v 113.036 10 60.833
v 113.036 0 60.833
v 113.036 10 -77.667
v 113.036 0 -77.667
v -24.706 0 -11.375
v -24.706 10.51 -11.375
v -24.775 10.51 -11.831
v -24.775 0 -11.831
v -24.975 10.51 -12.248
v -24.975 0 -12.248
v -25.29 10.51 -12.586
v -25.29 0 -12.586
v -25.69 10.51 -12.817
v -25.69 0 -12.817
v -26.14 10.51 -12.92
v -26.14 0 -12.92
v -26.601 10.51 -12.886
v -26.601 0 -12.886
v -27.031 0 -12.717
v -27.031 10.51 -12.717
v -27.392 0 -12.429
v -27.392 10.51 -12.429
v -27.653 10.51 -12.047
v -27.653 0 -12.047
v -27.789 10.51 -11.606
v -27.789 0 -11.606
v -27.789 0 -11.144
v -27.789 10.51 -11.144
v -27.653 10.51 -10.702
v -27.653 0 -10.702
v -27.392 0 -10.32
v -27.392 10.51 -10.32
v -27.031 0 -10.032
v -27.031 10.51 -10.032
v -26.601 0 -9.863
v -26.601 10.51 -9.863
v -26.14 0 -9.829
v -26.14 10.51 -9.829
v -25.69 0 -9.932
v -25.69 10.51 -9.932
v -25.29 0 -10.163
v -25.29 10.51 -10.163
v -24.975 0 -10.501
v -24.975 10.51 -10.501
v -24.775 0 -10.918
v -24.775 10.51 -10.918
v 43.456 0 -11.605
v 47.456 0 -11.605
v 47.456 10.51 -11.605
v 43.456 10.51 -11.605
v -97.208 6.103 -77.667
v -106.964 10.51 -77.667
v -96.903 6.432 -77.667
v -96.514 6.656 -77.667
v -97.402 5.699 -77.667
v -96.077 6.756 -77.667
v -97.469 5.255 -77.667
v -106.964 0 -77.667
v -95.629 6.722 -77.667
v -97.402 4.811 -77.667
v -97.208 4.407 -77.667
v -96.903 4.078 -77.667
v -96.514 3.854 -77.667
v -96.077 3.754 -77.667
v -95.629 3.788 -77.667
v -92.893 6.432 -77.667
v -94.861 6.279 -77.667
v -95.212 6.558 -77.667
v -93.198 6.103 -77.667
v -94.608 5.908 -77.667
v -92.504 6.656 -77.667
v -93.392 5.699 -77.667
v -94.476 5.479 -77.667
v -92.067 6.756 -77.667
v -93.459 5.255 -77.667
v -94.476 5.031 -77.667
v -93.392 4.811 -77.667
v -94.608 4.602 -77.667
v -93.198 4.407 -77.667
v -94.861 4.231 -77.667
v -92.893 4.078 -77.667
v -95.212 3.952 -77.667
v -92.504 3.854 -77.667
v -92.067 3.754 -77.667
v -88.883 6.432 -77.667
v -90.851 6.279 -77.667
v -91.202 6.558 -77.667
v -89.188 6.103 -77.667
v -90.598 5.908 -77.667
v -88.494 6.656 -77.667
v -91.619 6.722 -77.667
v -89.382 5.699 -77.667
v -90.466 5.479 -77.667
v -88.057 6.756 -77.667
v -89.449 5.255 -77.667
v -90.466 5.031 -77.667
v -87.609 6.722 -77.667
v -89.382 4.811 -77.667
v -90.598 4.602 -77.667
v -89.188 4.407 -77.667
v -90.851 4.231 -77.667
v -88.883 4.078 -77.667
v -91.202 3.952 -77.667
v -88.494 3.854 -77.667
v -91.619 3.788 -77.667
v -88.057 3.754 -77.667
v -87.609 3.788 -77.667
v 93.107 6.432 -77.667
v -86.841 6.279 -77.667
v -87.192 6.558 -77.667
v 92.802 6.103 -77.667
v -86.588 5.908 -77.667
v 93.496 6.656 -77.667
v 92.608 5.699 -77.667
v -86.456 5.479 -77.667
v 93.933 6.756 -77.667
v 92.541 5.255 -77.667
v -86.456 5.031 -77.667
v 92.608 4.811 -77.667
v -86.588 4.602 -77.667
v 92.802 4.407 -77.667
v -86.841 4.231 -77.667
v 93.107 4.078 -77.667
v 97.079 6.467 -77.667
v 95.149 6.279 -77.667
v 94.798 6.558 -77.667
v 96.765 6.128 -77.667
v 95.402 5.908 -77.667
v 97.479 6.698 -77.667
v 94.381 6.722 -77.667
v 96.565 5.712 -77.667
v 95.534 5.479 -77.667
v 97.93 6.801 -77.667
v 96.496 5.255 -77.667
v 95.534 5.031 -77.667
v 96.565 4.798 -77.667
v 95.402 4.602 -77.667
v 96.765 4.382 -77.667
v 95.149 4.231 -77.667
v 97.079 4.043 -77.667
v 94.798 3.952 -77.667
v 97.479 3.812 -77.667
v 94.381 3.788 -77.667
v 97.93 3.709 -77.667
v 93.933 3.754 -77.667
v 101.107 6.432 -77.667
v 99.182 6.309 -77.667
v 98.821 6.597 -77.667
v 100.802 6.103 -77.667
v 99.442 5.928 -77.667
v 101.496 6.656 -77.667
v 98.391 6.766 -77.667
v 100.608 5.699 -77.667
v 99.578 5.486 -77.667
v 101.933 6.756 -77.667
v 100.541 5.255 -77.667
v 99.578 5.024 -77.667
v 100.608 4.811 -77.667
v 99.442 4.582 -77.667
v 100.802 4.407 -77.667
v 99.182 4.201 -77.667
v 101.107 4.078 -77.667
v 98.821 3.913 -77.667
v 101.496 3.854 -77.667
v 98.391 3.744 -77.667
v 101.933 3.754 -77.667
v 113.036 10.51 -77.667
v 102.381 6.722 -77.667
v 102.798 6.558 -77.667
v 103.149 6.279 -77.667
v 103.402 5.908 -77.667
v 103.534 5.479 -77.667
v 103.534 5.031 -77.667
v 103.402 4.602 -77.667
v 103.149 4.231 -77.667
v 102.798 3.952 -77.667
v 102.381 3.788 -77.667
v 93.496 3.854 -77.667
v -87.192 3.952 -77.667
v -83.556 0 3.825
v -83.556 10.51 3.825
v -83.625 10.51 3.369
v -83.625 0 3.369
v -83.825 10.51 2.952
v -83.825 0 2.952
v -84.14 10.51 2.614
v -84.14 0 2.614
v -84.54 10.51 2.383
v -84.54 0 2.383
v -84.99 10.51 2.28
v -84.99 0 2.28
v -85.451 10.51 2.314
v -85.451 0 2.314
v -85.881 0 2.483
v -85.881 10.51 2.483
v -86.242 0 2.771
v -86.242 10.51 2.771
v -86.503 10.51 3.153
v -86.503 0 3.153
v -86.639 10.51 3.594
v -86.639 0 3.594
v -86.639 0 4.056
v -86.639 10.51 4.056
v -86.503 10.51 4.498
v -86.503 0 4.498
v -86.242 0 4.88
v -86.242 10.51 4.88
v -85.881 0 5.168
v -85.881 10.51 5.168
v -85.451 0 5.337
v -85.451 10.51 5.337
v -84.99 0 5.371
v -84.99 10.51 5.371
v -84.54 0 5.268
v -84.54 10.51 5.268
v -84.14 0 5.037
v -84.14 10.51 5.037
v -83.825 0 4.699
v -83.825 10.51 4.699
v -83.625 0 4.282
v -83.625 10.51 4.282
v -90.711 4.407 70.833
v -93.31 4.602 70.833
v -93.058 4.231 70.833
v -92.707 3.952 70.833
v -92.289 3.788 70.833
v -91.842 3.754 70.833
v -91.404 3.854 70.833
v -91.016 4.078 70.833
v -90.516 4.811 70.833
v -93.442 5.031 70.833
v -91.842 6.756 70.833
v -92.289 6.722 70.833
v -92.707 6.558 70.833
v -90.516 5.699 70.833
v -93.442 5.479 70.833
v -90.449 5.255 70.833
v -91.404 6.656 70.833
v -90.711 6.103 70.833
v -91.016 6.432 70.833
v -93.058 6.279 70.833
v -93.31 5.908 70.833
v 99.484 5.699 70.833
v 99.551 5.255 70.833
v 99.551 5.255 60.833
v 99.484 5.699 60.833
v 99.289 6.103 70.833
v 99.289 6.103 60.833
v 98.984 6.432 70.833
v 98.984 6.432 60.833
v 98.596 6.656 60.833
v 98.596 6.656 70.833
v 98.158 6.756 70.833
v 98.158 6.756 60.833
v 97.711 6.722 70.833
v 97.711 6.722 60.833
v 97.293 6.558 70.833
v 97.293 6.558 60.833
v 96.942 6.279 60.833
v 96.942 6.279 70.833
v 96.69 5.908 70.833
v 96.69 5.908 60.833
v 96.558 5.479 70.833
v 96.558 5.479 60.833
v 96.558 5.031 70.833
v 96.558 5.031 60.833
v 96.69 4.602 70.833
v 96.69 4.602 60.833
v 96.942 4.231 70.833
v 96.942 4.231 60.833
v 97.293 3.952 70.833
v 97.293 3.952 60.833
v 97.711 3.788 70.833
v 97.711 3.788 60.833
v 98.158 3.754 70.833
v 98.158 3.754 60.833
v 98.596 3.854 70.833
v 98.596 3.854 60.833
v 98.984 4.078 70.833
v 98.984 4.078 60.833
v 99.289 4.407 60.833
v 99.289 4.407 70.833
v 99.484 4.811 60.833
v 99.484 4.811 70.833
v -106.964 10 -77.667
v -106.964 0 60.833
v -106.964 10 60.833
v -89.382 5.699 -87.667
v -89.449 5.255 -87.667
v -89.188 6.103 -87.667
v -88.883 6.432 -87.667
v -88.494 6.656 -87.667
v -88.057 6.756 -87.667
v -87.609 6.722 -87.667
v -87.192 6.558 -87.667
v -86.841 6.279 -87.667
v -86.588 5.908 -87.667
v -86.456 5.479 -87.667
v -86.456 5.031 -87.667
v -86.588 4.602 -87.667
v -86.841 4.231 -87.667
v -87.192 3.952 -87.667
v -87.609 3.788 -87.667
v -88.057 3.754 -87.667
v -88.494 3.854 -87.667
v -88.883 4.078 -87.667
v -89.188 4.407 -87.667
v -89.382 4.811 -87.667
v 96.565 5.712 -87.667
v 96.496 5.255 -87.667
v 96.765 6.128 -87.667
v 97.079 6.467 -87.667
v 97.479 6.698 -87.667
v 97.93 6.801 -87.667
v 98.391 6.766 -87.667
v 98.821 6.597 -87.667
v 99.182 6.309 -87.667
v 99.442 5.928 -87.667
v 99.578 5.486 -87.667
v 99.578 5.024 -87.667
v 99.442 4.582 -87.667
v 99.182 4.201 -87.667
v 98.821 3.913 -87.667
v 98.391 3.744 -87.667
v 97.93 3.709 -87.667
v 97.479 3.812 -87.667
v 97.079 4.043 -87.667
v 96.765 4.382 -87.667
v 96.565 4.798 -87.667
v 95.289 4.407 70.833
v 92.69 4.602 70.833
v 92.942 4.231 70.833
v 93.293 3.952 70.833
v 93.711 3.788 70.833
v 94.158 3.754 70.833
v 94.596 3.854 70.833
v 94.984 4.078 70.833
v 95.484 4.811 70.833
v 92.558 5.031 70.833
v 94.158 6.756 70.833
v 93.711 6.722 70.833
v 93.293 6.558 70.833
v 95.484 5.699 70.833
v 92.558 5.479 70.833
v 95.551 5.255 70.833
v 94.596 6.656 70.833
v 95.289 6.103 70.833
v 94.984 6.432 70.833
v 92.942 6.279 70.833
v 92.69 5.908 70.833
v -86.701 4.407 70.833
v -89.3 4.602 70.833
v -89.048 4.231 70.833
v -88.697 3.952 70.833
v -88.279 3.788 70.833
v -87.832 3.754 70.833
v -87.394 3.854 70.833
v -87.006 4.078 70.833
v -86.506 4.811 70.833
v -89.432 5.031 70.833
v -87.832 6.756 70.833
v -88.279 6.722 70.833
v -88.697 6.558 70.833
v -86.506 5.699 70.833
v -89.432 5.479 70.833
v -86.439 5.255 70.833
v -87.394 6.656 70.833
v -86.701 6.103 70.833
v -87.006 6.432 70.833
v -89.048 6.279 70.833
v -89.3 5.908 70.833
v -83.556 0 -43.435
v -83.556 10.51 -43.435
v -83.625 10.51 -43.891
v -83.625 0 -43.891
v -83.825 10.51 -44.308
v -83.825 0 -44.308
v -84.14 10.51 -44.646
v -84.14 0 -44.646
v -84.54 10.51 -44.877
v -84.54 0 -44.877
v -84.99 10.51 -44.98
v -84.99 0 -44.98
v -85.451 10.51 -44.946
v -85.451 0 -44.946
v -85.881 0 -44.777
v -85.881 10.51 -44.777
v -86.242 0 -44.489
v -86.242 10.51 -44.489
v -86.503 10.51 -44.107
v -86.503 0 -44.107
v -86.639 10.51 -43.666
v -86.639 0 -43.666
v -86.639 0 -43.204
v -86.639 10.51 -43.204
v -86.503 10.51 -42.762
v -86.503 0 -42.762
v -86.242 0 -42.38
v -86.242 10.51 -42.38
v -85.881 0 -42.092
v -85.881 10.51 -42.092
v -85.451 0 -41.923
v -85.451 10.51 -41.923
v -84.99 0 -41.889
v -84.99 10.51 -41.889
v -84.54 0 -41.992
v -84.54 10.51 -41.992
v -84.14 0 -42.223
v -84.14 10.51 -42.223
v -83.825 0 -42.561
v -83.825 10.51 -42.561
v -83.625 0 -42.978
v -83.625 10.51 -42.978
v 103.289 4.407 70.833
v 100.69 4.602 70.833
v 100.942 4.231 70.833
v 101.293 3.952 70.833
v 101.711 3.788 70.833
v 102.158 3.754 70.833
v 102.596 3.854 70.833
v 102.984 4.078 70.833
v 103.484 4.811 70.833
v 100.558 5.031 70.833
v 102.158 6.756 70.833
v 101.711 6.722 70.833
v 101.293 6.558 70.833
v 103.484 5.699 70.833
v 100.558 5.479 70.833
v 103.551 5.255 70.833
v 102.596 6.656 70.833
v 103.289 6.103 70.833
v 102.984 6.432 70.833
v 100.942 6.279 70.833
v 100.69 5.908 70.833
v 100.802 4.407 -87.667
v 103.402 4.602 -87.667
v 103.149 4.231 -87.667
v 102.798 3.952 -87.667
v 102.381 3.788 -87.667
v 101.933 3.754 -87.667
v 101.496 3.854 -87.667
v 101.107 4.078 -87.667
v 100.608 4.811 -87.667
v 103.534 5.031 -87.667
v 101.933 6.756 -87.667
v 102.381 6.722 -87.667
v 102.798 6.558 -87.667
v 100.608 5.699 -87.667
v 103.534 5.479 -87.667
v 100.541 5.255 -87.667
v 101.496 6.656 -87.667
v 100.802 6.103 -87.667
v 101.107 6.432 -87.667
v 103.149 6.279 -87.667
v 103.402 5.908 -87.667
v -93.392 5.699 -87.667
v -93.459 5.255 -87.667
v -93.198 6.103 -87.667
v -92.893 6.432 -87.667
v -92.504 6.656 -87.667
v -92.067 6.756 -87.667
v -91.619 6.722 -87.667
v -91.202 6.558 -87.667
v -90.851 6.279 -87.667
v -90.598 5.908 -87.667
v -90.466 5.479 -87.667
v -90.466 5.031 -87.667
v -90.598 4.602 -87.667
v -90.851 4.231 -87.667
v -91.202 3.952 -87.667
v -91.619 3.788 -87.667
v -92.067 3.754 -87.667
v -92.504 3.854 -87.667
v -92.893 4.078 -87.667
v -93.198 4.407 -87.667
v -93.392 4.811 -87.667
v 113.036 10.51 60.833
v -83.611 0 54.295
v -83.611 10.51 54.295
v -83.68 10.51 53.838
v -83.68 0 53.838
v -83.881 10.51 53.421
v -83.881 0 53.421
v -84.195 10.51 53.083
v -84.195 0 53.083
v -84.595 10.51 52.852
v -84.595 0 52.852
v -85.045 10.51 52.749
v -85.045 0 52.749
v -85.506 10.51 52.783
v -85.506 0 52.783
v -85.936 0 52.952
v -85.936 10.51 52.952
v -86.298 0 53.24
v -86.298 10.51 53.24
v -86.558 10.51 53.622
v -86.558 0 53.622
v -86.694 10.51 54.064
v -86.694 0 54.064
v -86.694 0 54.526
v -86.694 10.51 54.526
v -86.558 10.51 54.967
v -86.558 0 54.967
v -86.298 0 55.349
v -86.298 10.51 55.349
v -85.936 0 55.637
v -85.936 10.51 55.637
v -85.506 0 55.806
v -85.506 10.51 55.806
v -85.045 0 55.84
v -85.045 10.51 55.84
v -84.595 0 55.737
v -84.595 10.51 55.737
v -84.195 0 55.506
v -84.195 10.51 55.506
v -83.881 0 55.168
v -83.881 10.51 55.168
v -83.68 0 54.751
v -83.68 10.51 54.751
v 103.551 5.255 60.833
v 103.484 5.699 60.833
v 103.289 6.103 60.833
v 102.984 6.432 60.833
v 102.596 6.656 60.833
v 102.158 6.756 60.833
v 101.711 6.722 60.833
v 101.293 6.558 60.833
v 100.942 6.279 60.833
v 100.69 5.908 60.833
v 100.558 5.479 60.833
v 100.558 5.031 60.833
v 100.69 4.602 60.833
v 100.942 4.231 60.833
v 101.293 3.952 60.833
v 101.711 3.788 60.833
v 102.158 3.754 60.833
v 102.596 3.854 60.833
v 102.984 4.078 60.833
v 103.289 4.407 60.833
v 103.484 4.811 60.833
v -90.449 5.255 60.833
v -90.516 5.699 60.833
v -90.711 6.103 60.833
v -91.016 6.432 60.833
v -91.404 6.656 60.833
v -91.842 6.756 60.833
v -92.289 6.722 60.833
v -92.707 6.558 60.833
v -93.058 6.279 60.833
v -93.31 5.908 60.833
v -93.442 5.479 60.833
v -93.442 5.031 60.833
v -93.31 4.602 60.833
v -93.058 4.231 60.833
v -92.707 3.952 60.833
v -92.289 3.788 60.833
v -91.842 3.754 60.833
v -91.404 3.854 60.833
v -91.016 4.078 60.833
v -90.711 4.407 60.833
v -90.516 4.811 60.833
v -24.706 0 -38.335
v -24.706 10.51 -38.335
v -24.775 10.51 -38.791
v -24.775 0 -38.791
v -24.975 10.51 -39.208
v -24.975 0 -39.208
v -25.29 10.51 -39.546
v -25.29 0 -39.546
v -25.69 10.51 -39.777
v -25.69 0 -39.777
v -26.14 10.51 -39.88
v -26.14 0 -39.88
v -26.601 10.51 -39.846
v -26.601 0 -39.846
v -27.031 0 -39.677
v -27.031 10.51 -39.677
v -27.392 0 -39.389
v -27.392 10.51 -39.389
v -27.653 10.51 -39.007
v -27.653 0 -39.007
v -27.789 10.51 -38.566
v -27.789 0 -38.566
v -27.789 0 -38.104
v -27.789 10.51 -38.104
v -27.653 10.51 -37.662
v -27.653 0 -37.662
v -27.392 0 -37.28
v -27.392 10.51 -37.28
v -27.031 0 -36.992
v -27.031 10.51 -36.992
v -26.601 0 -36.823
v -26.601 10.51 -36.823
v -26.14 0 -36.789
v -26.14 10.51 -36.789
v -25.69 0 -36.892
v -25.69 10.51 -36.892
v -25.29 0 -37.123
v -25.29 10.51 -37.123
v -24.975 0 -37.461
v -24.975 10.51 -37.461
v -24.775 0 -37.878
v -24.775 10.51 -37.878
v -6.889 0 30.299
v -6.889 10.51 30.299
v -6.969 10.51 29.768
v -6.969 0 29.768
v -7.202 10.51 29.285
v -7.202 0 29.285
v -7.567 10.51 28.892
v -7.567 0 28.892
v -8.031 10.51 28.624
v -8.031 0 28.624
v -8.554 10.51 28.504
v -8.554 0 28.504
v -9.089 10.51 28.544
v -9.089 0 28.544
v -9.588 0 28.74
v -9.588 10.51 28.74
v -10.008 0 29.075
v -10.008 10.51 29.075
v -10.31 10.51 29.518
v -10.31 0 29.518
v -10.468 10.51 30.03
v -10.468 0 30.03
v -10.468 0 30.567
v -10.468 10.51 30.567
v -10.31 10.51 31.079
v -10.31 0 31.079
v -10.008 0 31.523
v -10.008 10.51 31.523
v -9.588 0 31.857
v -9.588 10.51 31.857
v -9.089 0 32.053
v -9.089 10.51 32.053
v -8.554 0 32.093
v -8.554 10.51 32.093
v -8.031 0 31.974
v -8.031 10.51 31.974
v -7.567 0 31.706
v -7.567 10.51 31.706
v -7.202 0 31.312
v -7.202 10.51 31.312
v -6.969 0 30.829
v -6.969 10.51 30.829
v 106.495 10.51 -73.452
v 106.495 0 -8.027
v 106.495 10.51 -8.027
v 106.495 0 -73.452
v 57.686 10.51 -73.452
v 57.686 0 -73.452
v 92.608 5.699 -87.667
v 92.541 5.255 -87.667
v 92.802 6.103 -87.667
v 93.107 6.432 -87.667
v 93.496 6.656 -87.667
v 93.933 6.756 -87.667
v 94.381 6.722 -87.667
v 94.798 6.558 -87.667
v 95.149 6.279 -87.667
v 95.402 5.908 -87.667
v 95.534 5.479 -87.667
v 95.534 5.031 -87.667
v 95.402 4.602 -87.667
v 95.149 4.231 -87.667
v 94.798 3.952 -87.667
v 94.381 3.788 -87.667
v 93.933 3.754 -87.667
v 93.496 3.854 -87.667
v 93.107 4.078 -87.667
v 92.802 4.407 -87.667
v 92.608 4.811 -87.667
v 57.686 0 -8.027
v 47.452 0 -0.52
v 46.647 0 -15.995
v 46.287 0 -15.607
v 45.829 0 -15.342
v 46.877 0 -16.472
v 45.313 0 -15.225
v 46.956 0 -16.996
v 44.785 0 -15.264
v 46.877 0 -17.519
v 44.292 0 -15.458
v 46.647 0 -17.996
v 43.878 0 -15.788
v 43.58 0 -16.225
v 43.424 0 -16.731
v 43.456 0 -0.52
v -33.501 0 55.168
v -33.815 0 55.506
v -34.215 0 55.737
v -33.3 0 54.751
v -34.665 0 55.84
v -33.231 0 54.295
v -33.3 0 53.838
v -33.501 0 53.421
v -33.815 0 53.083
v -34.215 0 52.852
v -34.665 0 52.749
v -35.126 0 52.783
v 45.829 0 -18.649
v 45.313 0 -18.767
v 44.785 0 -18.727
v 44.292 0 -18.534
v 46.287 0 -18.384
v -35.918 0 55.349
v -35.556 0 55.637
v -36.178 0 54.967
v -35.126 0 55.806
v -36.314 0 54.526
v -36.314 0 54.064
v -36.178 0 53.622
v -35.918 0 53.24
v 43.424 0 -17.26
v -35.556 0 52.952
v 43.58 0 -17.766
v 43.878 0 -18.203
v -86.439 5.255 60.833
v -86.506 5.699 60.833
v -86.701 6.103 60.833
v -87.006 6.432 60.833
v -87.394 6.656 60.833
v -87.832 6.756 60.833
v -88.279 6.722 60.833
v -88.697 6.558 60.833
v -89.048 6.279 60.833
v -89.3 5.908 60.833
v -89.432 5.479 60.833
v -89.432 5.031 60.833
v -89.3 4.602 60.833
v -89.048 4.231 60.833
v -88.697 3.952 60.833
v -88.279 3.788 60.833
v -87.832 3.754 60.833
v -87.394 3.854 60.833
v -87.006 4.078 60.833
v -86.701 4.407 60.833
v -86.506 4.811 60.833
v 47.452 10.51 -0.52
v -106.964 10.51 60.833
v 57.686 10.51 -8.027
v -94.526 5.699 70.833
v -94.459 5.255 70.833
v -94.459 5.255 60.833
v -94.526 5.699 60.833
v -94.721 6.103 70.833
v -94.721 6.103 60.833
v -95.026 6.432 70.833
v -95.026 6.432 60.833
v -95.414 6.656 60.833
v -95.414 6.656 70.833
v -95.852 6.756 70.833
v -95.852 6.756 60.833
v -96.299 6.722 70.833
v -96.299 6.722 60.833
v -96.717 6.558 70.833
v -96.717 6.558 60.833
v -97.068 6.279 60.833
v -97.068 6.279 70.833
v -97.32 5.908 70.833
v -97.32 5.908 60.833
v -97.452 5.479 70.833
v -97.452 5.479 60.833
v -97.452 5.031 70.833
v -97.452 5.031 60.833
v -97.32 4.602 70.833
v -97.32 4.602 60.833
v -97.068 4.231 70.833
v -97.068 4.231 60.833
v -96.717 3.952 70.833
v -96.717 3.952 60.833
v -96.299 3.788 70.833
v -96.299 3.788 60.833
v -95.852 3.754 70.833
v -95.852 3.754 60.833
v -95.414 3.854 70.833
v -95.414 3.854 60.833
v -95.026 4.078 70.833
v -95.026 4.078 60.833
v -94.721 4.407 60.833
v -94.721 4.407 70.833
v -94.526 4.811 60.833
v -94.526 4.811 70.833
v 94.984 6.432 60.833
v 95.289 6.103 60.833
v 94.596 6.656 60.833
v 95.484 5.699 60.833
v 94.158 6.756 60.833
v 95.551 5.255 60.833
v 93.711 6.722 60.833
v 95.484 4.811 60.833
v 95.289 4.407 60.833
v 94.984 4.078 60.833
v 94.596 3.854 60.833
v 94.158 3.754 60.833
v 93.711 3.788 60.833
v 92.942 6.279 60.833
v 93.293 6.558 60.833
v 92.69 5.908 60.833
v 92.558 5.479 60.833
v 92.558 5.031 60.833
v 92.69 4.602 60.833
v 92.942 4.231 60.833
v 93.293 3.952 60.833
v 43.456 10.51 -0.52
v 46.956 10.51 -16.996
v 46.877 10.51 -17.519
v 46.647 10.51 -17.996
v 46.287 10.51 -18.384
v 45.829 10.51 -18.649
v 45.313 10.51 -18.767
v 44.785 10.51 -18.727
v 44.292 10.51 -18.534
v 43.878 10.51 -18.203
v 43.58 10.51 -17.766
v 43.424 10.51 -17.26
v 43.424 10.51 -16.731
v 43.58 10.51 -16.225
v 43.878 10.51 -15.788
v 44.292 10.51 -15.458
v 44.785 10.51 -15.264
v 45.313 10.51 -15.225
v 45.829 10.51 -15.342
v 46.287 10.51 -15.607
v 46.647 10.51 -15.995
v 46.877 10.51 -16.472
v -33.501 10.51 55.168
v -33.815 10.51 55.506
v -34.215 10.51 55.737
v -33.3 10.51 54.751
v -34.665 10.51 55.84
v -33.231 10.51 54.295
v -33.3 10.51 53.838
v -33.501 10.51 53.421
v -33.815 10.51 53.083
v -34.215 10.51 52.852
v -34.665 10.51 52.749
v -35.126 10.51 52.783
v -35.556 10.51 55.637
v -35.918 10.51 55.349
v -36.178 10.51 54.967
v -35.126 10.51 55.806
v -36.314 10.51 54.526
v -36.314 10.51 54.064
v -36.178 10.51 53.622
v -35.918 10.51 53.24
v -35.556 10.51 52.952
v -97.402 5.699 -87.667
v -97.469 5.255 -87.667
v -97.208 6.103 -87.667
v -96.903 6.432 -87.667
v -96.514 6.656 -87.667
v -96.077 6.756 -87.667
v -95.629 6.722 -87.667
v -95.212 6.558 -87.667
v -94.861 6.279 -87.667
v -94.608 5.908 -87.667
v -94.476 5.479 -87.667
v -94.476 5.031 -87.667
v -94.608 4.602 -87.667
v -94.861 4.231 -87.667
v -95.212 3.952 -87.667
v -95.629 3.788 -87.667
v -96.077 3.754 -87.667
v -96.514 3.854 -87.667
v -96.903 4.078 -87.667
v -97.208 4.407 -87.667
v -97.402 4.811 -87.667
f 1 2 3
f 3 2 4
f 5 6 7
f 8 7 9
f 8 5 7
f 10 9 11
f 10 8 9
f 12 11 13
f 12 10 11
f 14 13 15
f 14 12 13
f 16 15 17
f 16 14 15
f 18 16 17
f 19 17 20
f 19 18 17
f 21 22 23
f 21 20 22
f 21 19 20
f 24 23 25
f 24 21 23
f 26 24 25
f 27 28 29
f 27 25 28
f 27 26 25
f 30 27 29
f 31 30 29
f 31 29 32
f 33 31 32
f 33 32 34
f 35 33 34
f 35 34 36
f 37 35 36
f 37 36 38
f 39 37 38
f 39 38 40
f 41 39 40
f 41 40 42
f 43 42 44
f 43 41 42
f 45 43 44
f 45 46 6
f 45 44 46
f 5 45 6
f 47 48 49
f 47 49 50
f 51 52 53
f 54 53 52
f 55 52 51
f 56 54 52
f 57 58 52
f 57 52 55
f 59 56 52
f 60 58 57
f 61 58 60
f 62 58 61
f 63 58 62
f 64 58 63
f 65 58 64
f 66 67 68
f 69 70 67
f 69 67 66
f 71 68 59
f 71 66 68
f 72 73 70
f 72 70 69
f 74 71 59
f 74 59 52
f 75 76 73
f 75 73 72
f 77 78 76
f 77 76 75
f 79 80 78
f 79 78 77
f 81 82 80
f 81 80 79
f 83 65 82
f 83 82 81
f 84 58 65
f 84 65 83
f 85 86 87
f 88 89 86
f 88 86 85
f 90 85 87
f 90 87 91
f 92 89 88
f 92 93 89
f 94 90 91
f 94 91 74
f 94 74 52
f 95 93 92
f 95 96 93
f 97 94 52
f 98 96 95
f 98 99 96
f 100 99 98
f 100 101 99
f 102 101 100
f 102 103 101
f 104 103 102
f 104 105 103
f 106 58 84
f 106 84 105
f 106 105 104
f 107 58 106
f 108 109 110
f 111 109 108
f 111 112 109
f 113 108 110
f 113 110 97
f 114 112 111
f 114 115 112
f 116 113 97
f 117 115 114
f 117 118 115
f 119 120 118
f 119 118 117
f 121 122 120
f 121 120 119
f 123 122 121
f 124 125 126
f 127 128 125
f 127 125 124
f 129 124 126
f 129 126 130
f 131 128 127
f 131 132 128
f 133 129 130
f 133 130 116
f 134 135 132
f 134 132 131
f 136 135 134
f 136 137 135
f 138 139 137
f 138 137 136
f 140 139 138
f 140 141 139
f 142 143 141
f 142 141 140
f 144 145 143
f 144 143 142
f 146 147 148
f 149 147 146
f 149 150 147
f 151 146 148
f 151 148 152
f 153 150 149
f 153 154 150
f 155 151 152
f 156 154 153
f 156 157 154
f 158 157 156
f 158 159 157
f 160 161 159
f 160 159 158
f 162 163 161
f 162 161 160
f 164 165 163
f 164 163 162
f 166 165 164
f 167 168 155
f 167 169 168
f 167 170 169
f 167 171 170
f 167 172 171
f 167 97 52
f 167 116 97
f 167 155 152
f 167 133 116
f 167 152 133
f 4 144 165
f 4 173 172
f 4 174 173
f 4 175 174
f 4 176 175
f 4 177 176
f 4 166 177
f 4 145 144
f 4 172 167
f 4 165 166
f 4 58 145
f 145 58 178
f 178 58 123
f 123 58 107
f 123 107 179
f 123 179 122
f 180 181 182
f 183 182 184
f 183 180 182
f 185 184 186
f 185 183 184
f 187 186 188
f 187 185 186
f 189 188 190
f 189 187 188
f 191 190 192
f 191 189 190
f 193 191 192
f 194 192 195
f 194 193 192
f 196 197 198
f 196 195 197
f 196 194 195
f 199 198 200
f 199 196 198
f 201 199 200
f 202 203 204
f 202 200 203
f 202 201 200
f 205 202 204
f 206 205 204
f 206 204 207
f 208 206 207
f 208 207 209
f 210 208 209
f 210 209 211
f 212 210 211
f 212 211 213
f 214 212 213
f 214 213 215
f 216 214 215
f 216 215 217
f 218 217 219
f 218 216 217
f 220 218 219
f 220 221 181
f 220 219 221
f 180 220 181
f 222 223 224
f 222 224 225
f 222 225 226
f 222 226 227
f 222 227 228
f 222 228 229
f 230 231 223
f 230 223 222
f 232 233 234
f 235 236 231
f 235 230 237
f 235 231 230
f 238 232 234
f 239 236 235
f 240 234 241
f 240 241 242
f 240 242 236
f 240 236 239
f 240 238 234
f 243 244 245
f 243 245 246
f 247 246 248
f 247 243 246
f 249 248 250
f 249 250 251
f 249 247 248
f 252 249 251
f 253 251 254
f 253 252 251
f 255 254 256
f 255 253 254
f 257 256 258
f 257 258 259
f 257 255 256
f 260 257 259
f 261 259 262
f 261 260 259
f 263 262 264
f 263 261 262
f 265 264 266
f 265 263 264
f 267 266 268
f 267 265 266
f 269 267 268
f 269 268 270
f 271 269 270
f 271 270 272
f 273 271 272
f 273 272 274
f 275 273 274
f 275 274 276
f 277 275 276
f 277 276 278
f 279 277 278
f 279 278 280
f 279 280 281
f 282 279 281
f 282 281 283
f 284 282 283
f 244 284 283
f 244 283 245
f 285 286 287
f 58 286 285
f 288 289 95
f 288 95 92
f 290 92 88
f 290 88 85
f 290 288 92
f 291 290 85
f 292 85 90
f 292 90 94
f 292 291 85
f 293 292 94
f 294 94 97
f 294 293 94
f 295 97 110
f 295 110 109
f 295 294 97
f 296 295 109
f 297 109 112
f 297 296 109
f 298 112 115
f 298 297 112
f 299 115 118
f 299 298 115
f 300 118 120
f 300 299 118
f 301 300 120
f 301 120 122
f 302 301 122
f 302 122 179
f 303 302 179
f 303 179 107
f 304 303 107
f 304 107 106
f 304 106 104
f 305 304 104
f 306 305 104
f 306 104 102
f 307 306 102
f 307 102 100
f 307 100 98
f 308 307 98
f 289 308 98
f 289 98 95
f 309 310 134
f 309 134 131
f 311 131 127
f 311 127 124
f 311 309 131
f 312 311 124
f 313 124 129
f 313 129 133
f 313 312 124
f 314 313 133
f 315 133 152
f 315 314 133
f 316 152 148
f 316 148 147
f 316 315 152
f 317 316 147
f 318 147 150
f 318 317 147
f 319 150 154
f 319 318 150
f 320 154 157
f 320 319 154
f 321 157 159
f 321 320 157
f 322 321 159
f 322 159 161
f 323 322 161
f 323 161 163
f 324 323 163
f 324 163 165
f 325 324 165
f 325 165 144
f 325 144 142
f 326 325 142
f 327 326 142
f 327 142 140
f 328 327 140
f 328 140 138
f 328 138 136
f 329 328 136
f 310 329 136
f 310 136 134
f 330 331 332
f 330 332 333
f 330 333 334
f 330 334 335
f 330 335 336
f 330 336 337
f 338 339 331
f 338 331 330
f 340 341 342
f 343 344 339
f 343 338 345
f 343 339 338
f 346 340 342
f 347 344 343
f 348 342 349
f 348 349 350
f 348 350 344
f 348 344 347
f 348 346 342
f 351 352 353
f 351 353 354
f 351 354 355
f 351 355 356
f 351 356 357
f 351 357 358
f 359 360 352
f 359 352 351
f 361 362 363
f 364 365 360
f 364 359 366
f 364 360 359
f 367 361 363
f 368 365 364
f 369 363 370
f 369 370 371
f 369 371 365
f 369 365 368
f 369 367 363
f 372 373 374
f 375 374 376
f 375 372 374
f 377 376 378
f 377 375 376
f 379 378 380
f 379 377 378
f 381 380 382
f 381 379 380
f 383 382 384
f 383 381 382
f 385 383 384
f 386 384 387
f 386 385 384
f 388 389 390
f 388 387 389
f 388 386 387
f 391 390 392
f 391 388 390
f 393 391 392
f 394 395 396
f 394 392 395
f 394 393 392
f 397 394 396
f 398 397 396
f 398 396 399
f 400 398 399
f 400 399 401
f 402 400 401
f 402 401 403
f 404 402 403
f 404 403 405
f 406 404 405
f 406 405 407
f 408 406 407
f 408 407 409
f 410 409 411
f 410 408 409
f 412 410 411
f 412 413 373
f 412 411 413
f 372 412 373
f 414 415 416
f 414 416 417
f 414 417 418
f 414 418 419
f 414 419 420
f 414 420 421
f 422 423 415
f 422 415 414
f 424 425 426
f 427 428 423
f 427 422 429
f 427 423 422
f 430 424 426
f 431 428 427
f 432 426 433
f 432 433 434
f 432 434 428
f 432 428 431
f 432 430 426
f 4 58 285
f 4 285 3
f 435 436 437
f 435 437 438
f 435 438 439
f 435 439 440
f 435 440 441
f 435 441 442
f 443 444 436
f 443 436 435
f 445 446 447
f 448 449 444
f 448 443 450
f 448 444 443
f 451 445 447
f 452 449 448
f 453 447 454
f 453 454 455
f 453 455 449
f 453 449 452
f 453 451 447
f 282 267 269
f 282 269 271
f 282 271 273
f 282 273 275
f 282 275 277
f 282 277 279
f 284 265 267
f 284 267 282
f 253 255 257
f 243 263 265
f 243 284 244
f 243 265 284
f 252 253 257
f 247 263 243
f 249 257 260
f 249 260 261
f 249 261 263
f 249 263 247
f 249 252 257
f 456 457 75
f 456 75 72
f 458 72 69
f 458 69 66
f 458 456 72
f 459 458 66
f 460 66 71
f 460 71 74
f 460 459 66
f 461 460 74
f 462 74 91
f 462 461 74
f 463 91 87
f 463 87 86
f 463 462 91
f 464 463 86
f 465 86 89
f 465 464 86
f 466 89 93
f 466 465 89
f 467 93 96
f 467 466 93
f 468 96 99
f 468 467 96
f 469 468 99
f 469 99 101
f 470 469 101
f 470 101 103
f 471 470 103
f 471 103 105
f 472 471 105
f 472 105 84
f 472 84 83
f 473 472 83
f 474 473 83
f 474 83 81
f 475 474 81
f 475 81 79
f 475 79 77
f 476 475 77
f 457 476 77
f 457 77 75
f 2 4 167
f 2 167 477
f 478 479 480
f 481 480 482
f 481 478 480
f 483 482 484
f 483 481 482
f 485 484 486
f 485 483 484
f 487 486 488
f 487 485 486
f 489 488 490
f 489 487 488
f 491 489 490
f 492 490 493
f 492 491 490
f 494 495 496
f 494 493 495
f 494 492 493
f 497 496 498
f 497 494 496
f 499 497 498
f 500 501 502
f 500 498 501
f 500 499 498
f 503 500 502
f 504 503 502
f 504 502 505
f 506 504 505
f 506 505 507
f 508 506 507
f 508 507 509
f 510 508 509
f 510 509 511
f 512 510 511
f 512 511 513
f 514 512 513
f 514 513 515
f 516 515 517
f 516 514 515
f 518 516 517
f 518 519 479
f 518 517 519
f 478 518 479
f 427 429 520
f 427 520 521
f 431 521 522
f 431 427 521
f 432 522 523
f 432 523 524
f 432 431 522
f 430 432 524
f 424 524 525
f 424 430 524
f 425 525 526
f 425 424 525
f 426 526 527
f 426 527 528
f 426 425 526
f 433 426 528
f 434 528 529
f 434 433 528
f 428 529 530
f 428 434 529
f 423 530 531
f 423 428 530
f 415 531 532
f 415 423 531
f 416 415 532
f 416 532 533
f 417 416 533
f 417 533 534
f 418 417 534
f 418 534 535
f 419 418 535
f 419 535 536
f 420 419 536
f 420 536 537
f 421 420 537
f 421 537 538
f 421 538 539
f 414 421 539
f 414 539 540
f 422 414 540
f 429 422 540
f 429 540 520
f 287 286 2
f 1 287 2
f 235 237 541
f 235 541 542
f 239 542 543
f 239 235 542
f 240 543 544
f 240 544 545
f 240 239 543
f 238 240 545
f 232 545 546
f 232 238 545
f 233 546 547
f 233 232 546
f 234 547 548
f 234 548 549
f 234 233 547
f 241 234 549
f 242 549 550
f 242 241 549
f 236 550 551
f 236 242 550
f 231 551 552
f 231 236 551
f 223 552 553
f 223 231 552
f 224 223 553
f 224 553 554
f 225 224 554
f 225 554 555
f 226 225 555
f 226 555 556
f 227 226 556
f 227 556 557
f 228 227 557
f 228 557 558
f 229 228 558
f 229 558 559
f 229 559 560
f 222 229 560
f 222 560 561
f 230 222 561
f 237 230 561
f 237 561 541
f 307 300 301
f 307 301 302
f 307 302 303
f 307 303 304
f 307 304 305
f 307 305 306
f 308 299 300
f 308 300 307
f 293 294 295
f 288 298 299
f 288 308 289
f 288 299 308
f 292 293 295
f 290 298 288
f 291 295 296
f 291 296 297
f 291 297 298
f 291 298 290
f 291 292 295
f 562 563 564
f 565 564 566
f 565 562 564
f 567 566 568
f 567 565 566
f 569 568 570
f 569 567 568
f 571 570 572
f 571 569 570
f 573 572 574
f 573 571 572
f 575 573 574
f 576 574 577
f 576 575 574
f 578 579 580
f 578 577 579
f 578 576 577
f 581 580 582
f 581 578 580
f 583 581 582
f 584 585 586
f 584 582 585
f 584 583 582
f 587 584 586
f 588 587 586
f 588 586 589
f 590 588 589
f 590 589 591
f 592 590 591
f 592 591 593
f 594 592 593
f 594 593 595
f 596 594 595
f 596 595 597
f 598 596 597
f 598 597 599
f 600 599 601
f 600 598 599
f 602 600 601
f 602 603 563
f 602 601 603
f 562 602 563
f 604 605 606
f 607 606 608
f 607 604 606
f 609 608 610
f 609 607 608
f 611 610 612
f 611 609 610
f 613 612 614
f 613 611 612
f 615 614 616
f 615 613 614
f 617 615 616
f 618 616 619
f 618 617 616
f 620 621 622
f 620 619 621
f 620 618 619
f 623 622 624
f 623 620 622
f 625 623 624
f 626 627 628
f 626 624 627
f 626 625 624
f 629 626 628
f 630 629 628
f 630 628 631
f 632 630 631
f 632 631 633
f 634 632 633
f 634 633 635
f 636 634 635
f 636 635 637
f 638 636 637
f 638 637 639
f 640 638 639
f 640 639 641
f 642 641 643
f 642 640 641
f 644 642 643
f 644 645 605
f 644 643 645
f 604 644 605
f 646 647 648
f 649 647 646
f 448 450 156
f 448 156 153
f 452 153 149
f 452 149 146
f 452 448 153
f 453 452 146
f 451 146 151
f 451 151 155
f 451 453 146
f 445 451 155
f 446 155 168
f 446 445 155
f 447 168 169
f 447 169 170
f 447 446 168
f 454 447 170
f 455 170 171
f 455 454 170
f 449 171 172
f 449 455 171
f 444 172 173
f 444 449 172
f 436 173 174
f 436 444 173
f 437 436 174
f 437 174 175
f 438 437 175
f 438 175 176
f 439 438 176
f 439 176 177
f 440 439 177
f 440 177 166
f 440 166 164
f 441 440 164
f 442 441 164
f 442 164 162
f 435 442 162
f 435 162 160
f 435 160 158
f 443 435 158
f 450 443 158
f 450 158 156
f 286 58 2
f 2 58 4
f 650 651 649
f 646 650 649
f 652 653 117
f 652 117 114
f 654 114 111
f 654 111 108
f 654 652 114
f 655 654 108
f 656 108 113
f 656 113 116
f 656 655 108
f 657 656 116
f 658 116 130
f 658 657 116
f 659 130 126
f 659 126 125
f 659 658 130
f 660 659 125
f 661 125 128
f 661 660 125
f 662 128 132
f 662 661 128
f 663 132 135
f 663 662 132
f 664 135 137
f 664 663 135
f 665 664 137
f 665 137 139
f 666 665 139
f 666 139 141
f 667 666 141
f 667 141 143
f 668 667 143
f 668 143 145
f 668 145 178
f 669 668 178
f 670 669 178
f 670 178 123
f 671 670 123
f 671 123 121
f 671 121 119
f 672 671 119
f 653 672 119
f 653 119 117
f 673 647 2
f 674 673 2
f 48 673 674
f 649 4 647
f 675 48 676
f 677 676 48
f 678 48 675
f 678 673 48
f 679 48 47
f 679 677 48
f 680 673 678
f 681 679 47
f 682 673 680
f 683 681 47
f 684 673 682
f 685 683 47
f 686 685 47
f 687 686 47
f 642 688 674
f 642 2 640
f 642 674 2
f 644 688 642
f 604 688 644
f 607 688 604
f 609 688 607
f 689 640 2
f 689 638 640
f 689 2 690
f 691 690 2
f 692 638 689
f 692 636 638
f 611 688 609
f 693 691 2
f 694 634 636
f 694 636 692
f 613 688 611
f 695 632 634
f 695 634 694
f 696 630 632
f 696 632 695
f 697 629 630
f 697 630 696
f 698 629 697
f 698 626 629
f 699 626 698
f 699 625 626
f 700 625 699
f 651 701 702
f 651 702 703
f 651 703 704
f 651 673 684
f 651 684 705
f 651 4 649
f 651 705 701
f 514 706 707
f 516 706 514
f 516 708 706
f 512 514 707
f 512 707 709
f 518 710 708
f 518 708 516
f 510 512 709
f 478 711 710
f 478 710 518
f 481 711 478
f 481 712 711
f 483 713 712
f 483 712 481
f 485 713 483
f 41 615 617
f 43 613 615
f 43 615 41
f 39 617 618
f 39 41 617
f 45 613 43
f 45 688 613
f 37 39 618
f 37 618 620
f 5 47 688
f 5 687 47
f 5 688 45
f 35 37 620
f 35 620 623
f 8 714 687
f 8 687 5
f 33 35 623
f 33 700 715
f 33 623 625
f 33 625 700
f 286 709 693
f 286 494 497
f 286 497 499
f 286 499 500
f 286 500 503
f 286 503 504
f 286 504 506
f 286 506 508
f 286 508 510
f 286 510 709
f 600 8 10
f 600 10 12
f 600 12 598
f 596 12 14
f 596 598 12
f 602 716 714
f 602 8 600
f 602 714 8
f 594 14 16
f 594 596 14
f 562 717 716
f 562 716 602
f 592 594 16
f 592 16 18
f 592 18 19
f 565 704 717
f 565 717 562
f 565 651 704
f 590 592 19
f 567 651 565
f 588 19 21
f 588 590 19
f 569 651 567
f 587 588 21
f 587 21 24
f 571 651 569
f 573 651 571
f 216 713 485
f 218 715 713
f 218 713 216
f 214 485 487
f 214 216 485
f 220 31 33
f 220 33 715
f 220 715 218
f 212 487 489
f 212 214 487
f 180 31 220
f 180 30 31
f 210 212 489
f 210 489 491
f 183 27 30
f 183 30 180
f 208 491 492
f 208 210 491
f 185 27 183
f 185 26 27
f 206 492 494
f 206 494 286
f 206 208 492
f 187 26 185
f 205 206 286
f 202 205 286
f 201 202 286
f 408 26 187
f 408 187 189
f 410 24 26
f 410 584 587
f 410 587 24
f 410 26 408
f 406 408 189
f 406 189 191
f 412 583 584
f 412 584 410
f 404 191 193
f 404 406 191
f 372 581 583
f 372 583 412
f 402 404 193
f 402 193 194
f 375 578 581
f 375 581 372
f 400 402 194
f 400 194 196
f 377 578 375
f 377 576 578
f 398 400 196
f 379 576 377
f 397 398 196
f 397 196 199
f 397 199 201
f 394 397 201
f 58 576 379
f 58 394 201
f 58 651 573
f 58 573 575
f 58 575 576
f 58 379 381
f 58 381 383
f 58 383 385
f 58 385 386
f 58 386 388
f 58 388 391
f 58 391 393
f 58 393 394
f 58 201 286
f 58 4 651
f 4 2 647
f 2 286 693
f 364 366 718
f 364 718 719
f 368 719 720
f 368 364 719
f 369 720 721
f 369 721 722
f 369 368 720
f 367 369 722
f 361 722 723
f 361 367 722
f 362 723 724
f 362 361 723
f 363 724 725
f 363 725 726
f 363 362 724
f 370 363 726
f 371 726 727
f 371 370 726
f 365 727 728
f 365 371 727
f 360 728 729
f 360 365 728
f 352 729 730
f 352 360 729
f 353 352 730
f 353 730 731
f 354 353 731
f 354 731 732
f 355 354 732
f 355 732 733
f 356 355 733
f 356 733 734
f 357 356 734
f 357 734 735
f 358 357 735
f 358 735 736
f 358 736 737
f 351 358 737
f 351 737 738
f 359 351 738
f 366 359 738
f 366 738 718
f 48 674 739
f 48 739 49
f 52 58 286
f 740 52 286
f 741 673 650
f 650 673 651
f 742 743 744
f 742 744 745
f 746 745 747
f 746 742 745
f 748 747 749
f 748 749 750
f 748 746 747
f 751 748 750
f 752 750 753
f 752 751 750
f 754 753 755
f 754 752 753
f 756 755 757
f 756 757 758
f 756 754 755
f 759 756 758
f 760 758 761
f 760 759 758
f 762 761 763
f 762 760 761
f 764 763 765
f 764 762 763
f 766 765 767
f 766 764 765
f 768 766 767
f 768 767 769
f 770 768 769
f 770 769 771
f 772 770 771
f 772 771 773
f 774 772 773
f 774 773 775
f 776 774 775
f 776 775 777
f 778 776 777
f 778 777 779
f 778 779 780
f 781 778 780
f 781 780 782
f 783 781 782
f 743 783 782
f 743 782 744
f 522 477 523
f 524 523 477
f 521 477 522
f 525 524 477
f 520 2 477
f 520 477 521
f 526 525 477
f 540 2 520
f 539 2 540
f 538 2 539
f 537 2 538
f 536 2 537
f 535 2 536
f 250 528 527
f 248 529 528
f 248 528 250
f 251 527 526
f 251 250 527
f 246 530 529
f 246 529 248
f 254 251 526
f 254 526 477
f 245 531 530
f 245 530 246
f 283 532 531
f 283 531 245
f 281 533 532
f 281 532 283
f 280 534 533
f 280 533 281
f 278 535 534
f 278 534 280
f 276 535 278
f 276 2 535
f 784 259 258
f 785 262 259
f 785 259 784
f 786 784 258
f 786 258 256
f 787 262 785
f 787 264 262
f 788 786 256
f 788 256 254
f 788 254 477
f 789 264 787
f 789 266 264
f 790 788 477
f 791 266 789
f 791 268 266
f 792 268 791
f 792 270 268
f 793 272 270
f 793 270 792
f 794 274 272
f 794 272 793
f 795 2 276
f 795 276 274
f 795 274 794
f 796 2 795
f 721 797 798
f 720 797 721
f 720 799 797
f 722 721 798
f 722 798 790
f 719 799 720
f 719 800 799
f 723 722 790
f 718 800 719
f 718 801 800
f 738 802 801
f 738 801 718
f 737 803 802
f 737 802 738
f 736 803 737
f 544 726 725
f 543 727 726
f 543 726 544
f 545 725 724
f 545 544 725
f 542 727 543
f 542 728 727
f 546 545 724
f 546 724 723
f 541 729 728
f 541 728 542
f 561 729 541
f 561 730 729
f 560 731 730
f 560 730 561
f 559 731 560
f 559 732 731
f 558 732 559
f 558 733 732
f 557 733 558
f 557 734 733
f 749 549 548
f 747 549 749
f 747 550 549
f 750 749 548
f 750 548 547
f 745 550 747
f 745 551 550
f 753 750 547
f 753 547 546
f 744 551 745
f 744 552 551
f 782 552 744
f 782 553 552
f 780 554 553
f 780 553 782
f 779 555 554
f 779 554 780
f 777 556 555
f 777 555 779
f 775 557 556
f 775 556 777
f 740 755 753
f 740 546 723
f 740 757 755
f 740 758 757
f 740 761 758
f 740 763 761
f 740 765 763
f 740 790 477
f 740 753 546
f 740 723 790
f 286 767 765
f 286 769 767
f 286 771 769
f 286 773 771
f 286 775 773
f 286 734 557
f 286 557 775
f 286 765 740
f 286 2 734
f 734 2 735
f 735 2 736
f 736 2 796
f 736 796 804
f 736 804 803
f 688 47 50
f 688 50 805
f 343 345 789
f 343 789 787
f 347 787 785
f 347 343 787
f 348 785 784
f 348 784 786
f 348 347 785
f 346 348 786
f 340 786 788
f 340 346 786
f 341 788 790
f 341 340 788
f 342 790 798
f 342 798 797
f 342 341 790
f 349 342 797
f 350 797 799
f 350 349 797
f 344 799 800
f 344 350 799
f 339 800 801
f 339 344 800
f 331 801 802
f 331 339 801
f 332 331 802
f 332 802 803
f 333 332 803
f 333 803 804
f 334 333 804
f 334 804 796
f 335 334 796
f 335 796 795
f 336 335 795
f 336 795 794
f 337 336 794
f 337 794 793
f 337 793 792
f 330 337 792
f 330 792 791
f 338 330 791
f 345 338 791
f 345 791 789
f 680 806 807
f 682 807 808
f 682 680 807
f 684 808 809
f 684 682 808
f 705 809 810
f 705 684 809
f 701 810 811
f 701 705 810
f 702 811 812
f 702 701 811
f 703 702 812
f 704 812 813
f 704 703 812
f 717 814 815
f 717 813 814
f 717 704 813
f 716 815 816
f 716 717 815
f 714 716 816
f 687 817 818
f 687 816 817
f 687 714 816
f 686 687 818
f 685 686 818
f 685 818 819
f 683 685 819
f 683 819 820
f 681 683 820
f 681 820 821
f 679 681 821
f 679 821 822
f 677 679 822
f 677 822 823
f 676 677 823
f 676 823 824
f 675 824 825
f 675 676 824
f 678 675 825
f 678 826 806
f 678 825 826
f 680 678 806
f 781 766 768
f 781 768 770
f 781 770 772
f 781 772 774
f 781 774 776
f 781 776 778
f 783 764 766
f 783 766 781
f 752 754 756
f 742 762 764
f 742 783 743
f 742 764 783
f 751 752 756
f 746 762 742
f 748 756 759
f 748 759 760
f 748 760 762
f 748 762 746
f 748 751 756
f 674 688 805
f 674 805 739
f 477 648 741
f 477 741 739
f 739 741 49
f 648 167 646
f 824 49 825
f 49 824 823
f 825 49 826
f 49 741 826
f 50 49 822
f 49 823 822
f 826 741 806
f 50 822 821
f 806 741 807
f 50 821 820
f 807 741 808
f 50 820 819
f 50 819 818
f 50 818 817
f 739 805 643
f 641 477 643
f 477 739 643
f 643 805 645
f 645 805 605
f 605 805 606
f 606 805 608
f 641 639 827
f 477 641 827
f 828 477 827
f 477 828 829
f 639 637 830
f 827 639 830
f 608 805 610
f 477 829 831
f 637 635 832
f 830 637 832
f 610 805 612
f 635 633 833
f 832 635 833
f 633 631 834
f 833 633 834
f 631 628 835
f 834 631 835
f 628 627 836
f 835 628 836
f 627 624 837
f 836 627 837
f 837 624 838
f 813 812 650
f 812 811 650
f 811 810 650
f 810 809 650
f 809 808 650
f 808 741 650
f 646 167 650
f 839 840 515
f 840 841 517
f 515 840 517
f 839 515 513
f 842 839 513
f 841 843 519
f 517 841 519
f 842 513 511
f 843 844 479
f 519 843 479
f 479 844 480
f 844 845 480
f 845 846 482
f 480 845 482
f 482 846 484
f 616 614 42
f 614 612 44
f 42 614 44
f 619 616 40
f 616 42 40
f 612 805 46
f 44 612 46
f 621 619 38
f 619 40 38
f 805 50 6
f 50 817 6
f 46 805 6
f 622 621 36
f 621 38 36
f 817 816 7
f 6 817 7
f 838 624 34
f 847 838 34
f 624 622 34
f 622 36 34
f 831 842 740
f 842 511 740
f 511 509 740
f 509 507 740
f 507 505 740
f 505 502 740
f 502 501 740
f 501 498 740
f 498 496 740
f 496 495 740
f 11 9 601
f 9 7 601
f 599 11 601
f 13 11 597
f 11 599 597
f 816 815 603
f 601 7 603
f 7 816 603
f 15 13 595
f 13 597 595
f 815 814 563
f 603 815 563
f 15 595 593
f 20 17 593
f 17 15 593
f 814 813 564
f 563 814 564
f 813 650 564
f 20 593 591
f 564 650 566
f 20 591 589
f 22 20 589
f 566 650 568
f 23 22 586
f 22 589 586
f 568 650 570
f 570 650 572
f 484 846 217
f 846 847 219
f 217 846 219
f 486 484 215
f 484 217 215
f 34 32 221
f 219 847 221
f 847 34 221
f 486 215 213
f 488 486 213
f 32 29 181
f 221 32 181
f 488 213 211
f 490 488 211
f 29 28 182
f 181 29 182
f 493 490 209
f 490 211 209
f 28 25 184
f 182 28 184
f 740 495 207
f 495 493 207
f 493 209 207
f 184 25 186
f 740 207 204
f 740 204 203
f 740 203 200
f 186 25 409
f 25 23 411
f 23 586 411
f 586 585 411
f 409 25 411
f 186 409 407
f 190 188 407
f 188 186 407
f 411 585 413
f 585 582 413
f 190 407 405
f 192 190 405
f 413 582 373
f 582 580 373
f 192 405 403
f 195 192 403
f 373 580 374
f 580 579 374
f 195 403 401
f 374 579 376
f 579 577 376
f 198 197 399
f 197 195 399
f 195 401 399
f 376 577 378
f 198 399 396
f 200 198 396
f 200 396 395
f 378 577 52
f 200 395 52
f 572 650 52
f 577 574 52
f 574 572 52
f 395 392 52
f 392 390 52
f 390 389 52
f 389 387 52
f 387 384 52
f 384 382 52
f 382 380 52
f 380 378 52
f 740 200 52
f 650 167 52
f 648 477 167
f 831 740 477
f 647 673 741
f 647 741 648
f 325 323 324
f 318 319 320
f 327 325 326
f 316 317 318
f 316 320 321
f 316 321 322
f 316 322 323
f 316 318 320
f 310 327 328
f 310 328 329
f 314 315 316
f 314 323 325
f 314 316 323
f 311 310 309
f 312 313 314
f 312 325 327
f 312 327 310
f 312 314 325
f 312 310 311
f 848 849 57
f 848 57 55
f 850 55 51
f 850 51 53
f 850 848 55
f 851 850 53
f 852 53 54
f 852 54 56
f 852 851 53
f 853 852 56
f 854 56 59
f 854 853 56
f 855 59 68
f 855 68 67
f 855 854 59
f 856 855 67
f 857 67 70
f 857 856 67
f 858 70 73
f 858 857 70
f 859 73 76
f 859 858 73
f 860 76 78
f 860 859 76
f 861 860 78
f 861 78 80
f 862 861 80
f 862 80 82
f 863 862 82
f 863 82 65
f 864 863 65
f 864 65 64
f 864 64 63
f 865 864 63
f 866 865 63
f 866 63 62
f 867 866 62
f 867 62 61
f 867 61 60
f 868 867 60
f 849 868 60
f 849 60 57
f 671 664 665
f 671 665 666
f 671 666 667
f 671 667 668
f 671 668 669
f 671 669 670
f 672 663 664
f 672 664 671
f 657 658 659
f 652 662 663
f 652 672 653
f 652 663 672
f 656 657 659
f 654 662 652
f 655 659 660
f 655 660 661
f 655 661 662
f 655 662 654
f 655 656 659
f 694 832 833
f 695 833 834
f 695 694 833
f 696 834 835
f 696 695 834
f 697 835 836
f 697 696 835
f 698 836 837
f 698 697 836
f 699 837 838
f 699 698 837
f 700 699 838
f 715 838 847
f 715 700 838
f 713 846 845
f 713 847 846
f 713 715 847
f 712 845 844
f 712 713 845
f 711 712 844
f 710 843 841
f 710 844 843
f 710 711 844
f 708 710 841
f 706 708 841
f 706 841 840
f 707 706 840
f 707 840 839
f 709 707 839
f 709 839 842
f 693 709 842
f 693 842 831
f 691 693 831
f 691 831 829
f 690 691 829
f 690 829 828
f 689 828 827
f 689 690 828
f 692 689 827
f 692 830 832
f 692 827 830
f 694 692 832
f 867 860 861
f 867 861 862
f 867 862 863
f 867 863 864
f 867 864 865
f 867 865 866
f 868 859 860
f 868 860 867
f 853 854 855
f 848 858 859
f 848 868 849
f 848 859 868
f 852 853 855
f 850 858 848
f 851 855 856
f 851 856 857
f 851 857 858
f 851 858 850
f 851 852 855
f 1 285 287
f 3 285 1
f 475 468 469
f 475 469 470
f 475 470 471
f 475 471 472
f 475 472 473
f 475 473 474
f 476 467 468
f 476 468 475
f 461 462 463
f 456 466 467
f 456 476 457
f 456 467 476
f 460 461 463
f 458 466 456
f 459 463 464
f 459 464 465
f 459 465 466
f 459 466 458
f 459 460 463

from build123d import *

# Parameters (mm, degrees)
SKETCH1_W               = 220
SKETCH1_H               = 138.5
BOSS_EXTRUDE1_DEPTH     = 10
BOSS_EXTRUDE3_DEPTH     = 10.51
SKETCH6_R               = 1.505
BOSS_EXTRUDE4_DEPTH     = 16.5
SKETCH7_W               = 48.809005083
SKETCH7_H               = 65.424836601
CUT_EXTRUDE1_DEPTH      = 75
CUT_EXTRUDE1_DEPTH_BACK = 81
SKETCH8_R               = 1.505
SKETCH8_R_2             = 1.55
BOSS_EXTRUDE5_DEPTH     = 12
SKETCH9_R               = 1.55
SKETCH9_R_2             = 1.775907256
SKETCH9_R_3             = 1.799574189
CUT_EXTRUDE2_DEPTH      = 65
CUT_EXTRUDE2_DEPTH_BACK = 51


with BuildPart() as part:
    # Sketch1 → Boss-Extrude1 (new body)
    with BuildSketch(Plane(origin=(0, 0, 0), x_dir=(1, 0, 0), z_dir=(0, 1, 0))):
        with Locations((3.035702614, 8.416584967)):
            Rectangle(SKETCH1_W, SKETCH1_H)
    extrude(amount=BOSS_EXTRUDE1_DEPTH)


with BuildPart() as body_2:
    # Sketch5 → Boss-Extrude3 (new body)
    with BuildSketch(Plane(origin=(0, 0, 0), x_dir=(1, 0, 0), z_dir=(0, 1, 0))):
        Polygon((-106.964297386, 8.416584967), (-106.964297386, 77.666584967), (113.035702614, 77.666584967), (113.035702614, -60.833415033), (-106.964297386, -60.833415033), align=None)
    extrude(amount=BOSS_EXTRUDE3_DEPTH)

    # Sketch6 → Boss-Extrude4 (add)
    with BuildSketch(Plane.XY.offset(70.833415033)):
        with Locations((-95.964297386, 5.255)):
            Circle(SKETCH6_R)
        with Locations((-91.954297386, 5.255)):
            Circle(SKETCH6_R)
        with Locations((-87.944297386, 5.255)):
            Circle(SKETCH6_R)
        with Locations((94.045702614, 5.255)):
            Circle(SKETCH6_R)
        with Locations((98.045702614, 5.255)):
            Circle(SKETCH6_R)
        with Locations((102.045702614, 5.255)):
            Circle(SKETCH6_R)
    extrude(amount=-BOSS_EXTRUDE4_DEPTH)

    # Sketch7 → Cut-Extrude1 (cut, two sides)
    with BuildSketch(Plane(origin=(0, 0, 0), x_dir=(1, 0, 0), z_dir=(0, 1, 0))) as cut_extrude1_sk:
        with Locations((82.090713507, 40.739569717)):
            Rectangle(SKETCH7_W, SKETCH7_H)
    extrude(amount=CUT_EXTRUDE1_DEPTH, mode=Mode.SUBTRACT)
    extrude(cut_extrude1_sk.sketch, amount=-CUT_EXTRUDE1_DEPTH_BACK, mode=Mode.SUBTRACT)

    # Sketch8 → Boss-Extrude5 (add)
    with BuildSketch(Plane(origin=(0, 0, -87.666584967), x_dir=(-1, 0, 0), z_dir=(0, 0, -1))):
        with Locations((-102.045702614, 5.255)):
            Circle(SKETCH8_R)
        with Locations((-98.045702614, 5.255)):
            Circle(SKETCH8_R_2)
        with Locations((-94.045702614, 5.255)):
            Circle(SKETCH8_R)
        with Locations((95.964297386, 5.255)):
            Circle(SKETCH8_R)
        with Locations((91.954297386, 5.255)):
            Circle(SKETCH8_R)
        with Locations((87.944297386, 5.255)):
            Circle(SKETCH8_R)
    extrude(amount=-BOSS_EXTRUDE5_DEPTH)

    # Sketch9 → Cut-Extrude2 (cut, two sides)
    with BuildSketch(Plane(origin=(0, 0, 0), x_dir=(1, 0, 0), z_dir=(0, 1, 0))) as cut_extrude2_sk:
        with Locations((-85.161319051, -54.29455425)):
            Circle(SKETCH9_R)
        with Locations((-34.781319051, -54.29455425)):
            Circle(SKETCH9_R)
        with Locations((-85.10609114, -3.825384854)):
            Circle(SKETCH9_R)
        with Locations((-26.25609114, 11.374615146)):
            Circle(SKETCH9_R)
        with Locations((-26.25609114, 38.334615146)):
            Circle(SKETCH9_R)
        with Locations((-85.10609114, 43.434615146)):
            Circle(SKETCH9_R)
        with Locations((45.180112097, 16.995575273)):
            Circle(SKETCH9_R_2)
        with Locations((-8.688678328, -30.298677737)):
            Circle(SKETCH9_R_3)
        Polygon((43.455602968, 0.519563371), (47.452049454, 0.519563371), (47.455602968, 11.605206961), (43.455602968, 11.605206961), align=None)
    extrude(amount=CUT_EXTRUDE2_DEPTH, mode=Mode.SUBTRACT)
    extrude(cut_extrude2_sk.sketch, amount=-CUT_EXTRUDE2_DEPTH_BACK, mode=Mode.SUBTRACT)


solid = Compound([part.part, body_2.part])
